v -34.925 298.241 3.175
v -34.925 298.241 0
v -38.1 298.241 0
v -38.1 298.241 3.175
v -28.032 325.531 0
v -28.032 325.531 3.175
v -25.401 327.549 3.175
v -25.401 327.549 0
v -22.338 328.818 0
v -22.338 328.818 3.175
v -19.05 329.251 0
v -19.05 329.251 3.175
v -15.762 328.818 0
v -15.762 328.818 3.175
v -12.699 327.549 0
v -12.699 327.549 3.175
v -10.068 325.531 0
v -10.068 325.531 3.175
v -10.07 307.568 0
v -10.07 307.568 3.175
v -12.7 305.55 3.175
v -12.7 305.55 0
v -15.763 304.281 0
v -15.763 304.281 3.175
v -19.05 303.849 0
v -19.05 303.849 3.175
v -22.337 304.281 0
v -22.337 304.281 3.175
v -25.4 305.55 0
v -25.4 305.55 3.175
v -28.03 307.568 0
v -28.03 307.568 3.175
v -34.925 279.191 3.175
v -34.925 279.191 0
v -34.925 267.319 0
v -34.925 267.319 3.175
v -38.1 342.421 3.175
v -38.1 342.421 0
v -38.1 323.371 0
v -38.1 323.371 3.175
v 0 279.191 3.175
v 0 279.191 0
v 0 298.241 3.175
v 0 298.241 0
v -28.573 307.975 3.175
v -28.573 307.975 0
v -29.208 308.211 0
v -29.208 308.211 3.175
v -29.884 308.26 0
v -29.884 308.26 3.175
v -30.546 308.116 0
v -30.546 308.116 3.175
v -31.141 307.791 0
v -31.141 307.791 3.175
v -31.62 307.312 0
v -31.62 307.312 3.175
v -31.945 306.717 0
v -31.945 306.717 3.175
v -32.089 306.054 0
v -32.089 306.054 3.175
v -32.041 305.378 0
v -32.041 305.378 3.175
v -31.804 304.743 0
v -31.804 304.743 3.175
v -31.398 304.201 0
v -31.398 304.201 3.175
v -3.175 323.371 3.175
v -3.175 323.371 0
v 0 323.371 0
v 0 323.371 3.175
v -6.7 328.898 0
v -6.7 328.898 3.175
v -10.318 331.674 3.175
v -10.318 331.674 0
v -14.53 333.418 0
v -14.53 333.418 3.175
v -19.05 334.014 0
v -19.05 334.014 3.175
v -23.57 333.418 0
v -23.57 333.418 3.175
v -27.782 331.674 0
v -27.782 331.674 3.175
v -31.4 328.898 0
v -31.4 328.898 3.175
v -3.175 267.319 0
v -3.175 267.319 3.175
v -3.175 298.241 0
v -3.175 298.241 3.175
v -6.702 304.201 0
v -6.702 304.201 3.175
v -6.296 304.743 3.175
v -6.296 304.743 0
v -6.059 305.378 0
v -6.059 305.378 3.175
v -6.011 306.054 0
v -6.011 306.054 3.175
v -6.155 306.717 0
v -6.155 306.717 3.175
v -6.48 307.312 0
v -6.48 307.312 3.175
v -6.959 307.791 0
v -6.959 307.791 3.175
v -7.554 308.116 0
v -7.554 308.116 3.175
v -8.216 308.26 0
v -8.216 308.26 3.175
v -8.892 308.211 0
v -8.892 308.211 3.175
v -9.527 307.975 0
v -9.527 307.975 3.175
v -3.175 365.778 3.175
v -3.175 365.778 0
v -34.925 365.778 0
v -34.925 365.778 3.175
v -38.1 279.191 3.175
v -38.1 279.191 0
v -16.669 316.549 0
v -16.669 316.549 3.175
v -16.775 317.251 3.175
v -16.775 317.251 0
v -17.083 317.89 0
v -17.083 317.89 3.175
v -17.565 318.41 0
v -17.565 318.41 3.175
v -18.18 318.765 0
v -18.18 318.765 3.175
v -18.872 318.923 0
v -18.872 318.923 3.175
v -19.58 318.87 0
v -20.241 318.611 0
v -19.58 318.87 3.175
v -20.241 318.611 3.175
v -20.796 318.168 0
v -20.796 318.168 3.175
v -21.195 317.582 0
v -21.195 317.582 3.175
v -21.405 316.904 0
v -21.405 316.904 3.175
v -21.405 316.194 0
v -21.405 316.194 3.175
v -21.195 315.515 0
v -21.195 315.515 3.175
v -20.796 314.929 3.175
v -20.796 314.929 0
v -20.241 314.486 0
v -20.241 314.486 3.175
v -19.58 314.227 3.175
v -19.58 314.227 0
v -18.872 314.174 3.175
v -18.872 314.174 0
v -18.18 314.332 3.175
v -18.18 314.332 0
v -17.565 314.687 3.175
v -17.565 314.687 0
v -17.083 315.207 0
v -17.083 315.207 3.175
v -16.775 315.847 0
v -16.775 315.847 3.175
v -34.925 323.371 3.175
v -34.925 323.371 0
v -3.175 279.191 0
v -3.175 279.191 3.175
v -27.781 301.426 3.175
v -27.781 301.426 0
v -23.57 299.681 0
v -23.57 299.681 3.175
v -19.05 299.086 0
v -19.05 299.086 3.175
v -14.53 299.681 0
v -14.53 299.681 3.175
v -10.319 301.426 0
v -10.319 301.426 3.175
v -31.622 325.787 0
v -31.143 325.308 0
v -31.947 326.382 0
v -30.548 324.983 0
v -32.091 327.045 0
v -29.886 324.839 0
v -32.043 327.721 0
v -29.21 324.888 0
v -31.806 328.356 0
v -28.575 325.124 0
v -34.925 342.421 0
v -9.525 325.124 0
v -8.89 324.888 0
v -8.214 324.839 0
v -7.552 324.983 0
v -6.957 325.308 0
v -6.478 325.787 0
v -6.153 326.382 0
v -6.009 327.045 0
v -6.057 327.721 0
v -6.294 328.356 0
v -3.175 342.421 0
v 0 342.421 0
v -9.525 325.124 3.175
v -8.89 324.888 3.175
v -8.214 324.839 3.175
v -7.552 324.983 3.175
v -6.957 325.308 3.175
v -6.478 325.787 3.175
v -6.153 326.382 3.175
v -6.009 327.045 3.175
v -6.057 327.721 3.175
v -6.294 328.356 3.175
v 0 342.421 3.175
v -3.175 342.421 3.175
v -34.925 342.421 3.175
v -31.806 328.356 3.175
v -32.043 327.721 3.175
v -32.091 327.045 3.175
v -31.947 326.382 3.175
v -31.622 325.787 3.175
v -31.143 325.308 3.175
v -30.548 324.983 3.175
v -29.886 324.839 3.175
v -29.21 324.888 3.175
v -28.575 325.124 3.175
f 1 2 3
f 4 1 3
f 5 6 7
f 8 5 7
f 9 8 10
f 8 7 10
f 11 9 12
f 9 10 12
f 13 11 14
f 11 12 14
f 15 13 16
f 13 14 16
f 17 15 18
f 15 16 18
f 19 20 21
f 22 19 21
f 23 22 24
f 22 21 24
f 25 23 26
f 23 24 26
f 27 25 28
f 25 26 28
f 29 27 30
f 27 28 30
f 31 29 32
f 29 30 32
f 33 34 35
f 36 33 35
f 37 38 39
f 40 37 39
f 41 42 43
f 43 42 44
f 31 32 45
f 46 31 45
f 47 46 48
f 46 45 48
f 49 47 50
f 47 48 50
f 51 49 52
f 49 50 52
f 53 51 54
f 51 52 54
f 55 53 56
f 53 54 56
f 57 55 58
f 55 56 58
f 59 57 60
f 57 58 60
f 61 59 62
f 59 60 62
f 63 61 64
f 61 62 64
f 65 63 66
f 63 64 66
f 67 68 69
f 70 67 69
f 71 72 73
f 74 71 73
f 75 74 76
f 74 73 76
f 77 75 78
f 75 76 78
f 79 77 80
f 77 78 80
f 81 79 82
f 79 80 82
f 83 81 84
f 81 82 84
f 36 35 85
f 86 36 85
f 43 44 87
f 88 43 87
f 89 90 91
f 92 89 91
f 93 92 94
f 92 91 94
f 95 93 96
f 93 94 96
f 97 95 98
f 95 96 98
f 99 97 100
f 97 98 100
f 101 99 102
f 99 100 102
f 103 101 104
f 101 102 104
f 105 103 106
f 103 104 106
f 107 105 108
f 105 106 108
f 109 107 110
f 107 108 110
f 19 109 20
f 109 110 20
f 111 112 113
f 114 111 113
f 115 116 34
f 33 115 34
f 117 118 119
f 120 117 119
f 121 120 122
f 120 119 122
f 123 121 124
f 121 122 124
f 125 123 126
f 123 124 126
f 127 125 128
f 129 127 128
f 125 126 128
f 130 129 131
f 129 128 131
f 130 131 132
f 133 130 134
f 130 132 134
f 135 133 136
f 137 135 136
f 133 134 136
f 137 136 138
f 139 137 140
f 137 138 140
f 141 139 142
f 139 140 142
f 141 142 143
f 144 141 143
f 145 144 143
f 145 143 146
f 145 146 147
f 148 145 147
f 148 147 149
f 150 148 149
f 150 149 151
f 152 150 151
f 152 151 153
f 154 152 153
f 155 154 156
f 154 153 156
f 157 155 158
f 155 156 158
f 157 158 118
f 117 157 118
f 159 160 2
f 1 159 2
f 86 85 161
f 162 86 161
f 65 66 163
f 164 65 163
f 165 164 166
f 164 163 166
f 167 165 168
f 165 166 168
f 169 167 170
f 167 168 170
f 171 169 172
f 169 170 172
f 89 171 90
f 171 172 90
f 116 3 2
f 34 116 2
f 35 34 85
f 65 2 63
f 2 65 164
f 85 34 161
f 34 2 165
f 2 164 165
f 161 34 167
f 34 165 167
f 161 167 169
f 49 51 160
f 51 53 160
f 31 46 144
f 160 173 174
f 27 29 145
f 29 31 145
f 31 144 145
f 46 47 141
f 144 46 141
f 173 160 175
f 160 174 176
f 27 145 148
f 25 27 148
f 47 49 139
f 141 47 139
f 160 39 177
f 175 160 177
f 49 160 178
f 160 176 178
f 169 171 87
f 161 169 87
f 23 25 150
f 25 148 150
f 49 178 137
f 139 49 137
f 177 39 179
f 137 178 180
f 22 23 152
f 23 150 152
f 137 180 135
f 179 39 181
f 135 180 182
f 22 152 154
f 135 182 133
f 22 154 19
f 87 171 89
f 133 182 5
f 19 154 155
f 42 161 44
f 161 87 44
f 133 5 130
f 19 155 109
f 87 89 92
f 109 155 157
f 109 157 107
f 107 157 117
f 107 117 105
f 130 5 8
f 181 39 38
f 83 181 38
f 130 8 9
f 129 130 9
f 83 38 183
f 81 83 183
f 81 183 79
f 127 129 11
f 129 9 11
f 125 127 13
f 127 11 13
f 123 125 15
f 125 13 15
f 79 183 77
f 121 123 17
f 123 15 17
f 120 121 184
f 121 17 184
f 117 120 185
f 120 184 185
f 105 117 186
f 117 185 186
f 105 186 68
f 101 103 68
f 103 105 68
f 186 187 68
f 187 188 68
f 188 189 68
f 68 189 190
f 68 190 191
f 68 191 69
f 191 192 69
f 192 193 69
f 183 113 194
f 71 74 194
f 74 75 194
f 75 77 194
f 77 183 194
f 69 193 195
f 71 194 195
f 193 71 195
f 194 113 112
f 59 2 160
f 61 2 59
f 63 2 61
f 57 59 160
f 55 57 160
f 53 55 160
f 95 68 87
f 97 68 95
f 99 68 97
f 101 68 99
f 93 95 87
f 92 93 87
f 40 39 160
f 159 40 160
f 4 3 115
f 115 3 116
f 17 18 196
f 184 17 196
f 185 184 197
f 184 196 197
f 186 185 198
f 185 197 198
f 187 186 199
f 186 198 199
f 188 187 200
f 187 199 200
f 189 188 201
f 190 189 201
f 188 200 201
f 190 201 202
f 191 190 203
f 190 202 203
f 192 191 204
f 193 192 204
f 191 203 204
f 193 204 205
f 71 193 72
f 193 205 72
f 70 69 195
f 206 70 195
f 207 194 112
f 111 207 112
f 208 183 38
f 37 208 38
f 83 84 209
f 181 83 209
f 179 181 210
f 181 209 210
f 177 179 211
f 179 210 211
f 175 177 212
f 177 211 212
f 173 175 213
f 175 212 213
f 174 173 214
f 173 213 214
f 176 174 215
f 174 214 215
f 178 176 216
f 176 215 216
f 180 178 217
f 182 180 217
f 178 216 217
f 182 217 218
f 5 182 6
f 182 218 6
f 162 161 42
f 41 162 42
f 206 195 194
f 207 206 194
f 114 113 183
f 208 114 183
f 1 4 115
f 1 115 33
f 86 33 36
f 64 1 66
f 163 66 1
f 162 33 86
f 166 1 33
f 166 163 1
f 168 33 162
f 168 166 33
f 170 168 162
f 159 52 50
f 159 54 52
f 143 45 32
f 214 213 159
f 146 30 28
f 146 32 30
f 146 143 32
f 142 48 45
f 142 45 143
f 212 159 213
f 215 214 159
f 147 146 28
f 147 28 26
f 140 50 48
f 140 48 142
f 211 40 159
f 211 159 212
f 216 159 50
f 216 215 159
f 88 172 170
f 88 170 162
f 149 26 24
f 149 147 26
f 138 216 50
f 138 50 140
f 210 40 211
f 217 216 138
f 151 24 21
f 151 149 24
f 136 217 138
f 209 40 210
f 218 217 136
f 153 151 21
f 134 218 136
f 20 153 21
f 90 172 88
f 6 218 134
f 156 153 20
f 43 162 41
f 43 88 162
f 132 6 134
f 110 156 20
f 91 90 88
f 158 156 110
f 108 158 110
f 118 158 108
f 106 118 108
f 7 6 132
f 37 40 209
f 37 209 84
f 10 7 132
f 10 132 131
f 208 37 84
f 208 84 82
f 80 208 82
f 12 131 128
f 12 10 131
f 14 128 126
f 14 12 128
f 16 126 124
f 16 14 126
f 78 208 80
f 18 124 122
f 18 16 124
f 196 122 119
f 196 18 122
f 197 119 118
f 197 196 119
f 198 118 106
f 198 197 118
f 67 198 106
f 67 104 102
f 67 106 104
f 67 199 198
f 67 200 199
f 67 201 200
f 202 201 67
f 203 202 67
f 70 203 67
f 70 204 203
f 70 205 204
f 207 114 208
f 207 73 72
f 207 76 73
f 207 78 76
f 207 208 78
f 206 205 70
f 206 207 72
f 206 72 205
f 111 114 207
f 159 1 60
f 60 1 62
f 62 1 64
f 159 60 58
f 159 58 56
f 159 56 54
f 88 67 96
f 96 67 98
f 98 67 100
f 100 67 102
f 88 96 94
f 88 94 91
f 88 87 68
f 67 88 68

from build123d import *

# Parameters (mm, degrees)
BOSS_EXTRUDE1_DEPTH = 3.175
SKETCH3_R           = 2.38125
CUT_EXTRUDE2_DEPTH  = 3.175


with BuildPart() as part:
    # Sketch1 → Boss-Extrude1 (new body)
    with BuildSketch(Plane.XY):
        Polygon((-3.175, 365.778475051), (-34.925, 365.778475051), (-34.925, 342.421386502), (-38.1, 342.421386502), (-38.1, 323.371386502), (-34.925, 323.371386502), (-34.925, 298.240631325), (-38.1, 298.240631325), (-38.1, 279.190631325), (-34.925, 279.190631325), (-34.925, 267.318840011), (-3.175, 267.318840011), (-3.175, 279.190631325), (0, 279.190631325), (0, 298.240631325), (-3.175, 298.240631325), (-3.175, 323.371386502), (0, 323.371386502), (0, 342.421386502), (-3.175, 342.421386502), align=None)
    extrude(amount=BOSS_EXTRUDE1_DEPTH)

    # Sketch3 → Cut-Extrude2 (cut)
    with BuildSketch(Plane.XY.offset(3.175)):
        with Locations((-19.05, 316.548657531)):
            Circle(SKETCH3_R)
        with BuildLine():
            ThreePointArc((-6.700444288, 328.898213243), (-19.05, 334.013566708), (-31.399555712, 328.898213243))
            ThreePointArc((-31.399555712, 328.898213243), (-31.399555712, 325.530617198), (-28.031959666, 325.530617198))
            ThreePointArc((-28.031959666, 325.530617198), (-19.05, 329.251066708), (-10.068040334, 325.530617198))
            ThreePointArc((-10.068040334, 325.530617198), (-6.700444288, 325.530617198), (-6.700444288, 328.898213243))
        make_face()
        with BuildLine():
            ThreePointArc((-31.397852166, 304.200805365), (-19.05, 299.086157531), (-6.702147834, 304.200805365))
            ThreePointArc((-6.702147834, 304.200805365), (-6.702147834, 307.56840141), (-10.069743879, 307.56840141))
            ThreePointArc((-10.069743879, 307.56840141), (-19.05, 303.848657531), (-28.030256121, 307.56840141))
            ThreePointArc((-28.030256121, 307.56840141), (-31.397852166, 307.56840141), (-31.397852166, 304.200805365))
        make_face()
    extrude(amount=-CUT_EXTRUDE2_DEPTH, mode=Mode.SUBTRACT)


solid = part.part
